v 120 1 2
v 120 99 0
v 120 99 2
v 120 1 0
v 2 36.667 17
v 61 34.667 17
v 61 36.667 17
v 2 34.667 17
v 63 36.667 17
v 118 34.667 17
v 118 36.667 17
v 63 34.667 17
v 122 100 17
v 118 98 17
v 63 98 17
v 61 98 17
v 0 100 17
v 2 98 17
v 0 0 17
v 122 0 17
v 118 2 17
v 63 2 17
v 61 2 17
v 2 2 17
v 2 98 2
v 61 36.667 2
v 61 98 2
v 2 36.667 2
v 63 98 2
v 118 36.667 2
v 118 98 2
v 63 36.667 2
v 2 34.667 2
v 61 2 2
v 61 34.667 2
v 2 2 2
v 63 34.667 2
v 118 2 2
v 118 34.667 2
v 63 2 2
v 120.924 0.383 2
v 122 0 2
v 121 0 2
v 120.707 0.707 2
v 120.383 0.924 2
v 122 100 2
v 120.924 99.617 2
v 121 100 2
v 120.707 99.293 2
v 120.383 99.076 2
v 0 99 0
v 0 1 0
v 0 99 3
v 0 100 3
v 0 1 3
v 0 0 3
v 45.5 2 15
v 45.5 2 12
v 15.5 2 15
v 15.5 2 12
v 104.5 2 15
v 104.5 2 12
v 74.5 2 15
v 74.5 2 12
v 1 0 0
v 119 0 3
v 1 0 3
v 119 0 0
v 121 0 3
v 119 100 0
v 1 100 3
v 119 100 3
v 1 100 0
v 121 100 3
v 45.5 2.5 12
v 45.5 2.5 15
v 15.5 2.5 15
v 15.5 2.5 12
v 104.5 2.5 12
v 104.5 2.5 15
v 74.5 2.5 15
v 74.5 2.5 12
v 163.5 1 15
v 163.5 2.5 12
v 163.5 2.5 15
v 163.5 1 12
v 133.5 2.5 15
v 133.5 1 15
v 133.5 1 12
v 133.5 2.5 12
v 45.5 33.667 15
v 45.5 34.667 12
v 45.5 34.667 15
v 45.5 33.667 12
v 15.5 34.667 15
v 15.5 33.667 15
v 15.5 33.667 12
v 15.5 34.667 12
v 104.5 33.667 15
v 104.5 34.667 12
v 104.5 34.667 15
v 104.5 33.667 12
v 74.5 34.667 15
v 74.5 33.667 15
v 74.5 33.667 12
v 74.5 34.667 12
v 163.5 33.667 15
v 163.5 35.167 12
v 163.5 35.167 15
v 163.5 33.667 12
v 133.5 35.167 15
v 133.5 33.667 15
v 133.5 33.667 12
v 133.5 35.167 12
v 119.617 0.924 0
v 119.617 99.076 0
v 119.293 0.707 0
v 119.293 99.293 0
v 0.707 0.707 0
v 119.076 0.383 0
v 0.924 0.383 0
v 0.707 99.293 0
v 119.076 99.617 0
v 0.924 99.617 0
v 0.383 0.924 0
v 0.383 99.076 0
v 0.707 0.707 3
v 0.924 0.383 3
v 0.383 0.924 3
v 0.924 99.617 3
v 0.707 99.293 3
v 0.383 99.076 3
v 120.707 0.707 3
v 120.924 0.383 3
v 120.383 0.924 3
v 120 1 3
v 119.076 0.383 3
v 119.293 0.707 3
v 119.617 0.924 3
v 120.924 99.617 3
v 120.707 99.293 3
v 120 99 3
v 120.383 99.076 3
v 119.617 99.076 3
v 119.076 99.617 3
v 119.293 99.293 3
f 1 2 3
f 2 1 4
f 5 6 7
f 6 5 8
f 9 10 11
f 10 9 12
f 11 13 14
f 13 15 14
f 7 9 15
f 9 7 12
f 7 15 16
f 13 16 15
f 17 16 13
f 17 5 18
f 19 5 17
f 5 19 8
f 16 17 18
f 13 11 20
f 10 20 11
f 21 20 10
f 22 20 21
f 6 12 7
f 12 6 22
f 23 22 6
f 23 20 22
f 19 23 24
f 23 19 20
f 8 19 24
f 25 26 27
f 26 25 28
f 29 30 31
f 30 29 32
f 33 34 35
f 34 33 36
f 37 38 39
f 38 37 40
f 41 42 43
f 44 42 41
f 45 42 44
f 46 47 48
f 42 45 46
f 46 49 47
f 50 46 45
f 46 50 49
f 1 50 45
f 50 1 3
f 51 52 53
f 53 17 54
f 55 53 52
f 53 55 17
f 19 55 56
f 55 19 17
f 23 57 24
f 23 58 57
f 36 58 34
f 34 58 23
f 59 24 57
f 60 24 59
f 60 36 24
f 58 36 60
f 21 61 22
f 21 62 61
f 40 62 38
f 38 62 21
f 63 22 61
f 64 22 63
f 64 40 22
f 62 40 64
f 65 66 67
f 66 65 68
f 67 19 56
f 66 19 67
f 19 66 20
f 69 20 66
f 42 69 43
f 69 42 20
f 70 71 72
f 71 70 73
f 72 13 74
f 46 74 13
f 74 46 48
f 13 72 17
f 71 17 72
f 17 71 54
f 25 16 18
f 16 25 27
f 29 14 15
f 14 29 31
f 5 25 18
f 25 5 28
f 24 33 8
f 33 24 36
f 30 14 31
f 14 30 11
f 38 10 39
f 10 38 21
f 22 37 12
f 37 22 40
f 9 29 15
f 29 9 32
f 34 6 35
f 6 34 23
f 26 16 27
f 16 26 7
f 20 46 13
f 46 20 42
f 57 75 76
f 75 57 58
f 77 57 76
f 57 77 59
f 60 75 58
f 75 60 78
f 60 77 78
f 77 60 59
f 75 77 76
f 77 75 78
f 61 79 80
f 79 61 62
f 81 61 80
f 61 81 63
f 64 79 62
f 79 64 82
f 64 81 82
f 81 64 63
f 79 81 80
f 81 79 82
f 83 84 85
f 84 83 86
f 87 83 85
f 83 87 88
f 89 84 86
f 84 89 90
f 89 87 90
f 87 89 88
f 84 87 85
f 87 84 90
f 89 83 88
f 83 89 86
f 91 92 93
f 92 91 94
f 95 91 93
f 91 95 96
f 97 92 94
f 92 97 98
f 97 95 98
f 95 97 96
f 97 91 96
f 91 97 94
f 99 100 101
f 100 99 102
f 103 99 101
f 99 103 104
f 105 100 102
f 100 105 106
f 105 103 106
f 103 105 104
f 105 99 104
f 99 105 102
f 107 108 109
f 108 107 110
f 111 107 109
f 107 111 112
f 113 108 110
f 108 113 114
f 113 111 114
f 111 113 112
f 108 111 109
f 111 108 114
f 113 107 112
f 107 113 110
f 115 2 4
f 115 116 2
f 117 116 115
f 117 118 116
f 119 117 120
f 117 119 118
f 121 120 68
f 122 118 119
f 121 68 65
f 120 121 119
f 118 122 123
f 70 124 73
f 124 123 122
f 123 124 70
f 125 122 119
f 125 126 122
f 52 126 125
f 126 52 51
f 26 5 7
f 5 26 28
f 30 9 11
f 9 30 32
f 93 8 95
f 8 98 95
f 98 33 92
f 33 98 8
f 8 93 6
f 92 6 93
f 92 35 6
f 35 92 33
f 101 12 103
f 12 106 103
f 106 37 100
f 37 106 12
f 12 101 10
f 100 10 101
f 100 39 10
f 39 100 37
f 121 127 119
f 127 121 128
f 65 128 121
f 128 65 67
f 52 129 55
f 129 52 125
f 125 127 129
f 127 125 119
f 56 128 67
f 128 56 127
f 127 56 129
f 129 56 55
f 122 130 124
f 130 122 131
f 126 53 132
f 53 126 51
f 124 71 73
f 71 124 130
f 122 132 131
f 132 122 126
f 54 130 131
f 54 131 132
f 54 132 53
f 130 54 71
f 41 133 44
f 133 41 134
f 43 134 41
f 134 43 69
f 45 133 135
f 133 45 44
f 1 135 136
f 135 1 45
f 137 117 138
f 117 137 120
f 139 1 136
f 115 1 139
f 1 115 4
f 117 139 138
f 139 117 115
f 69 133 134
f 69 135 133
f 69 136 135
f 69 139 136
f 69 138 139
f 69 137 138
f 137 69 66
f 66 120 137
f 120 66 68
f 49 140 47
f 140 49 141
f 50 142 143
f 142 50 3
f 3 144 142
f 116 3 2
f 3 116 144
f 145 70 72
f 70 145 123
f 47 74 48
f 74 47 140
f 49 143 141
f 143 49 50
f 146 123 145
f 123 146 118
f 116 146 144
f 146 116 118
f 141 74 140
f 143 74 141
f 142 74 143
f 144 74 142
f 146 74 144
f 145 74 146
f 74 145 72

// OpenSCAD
// Small Parts Organizer
// For organizing USB drives, SD cards, adapters, and other small dev tools

// Parameters
organizer_width = 100;
organizer_length = 120;
base_height = 2;
wall_thickness = 2;
compartment_height = 15;

// Grid layout
rows = 2;
cols = 3;

// Main organizer module
module small_parts_organizer() {
    compartment_width = (organizer_width - wall_thickness * (cols + 1)) / cols;
    compartment_length = (organizer_length - wall_thickness * (rows + 1)) / rows;
    
    difference() {
        union() {
            // Base
            cube([organizer_length, organizer_width, base_height]);
            
            // Outer walls
            // Front and back
            for (y = [0, organizer_width - wall_thickness]) {
                translate([0, y, base_height]) {
                    cube([organizer_length, wall_thickness, compartment_height]);
                }
            }
            
            // Left and right
            for (x = [0, organizer_length - wall_thickness]) {
                translate([x, 0, base_height]) {
                    cube([wall_thickness, organizer_width, compartment_height]);
                }
            }
            
            // Internal dividers - vertical (along length)
            for (i = [1:rows-1]) {
                translate([0, wall_thickness + i * (compartment_width + wall_thickness), base_height]) {
                    cube([organizer_length, wall_thickness, compartment_height]);
                }
            }
            
            // Internal dividers - horizontal (along width)
            for (j = [1:cols-1]) {
                translate([wall_thickness + j * (compartment_length + wall_thickness), 0, base_height]) {
                    cube([wall_thickness, organizer_width, compartment_height]);
                }
            }
            
            // Label areas on outer walls
            for (i = [0:rows-1]) {
                for (j = [0:cols-1]) {
                    x_pos = wall_thickness + j * (compartment_length + wall_thickness) + compartment_length / 2;
                    y_pos = wall_thickness + i * (compartment_width + wall_thickness);
                    
                    translate([x_pos - 15, y_pos - 1, base_height + compartment_height - 5]) {
                        cube([30, 1.5, 3]);
                    }
                }
            }
        }
        
        // Rounded corners on outer edges (optional decoration)
        for (x = [0, organizer_length]) {
            for (y = [0, organizer_width]) {
                translate([x, y, -1]) {
                    cylinder(r = 1, h = base_height + 2, $fn = 16);
                }
            }
        }
    }
}

// Render the organizer
small_parts_organizer();
